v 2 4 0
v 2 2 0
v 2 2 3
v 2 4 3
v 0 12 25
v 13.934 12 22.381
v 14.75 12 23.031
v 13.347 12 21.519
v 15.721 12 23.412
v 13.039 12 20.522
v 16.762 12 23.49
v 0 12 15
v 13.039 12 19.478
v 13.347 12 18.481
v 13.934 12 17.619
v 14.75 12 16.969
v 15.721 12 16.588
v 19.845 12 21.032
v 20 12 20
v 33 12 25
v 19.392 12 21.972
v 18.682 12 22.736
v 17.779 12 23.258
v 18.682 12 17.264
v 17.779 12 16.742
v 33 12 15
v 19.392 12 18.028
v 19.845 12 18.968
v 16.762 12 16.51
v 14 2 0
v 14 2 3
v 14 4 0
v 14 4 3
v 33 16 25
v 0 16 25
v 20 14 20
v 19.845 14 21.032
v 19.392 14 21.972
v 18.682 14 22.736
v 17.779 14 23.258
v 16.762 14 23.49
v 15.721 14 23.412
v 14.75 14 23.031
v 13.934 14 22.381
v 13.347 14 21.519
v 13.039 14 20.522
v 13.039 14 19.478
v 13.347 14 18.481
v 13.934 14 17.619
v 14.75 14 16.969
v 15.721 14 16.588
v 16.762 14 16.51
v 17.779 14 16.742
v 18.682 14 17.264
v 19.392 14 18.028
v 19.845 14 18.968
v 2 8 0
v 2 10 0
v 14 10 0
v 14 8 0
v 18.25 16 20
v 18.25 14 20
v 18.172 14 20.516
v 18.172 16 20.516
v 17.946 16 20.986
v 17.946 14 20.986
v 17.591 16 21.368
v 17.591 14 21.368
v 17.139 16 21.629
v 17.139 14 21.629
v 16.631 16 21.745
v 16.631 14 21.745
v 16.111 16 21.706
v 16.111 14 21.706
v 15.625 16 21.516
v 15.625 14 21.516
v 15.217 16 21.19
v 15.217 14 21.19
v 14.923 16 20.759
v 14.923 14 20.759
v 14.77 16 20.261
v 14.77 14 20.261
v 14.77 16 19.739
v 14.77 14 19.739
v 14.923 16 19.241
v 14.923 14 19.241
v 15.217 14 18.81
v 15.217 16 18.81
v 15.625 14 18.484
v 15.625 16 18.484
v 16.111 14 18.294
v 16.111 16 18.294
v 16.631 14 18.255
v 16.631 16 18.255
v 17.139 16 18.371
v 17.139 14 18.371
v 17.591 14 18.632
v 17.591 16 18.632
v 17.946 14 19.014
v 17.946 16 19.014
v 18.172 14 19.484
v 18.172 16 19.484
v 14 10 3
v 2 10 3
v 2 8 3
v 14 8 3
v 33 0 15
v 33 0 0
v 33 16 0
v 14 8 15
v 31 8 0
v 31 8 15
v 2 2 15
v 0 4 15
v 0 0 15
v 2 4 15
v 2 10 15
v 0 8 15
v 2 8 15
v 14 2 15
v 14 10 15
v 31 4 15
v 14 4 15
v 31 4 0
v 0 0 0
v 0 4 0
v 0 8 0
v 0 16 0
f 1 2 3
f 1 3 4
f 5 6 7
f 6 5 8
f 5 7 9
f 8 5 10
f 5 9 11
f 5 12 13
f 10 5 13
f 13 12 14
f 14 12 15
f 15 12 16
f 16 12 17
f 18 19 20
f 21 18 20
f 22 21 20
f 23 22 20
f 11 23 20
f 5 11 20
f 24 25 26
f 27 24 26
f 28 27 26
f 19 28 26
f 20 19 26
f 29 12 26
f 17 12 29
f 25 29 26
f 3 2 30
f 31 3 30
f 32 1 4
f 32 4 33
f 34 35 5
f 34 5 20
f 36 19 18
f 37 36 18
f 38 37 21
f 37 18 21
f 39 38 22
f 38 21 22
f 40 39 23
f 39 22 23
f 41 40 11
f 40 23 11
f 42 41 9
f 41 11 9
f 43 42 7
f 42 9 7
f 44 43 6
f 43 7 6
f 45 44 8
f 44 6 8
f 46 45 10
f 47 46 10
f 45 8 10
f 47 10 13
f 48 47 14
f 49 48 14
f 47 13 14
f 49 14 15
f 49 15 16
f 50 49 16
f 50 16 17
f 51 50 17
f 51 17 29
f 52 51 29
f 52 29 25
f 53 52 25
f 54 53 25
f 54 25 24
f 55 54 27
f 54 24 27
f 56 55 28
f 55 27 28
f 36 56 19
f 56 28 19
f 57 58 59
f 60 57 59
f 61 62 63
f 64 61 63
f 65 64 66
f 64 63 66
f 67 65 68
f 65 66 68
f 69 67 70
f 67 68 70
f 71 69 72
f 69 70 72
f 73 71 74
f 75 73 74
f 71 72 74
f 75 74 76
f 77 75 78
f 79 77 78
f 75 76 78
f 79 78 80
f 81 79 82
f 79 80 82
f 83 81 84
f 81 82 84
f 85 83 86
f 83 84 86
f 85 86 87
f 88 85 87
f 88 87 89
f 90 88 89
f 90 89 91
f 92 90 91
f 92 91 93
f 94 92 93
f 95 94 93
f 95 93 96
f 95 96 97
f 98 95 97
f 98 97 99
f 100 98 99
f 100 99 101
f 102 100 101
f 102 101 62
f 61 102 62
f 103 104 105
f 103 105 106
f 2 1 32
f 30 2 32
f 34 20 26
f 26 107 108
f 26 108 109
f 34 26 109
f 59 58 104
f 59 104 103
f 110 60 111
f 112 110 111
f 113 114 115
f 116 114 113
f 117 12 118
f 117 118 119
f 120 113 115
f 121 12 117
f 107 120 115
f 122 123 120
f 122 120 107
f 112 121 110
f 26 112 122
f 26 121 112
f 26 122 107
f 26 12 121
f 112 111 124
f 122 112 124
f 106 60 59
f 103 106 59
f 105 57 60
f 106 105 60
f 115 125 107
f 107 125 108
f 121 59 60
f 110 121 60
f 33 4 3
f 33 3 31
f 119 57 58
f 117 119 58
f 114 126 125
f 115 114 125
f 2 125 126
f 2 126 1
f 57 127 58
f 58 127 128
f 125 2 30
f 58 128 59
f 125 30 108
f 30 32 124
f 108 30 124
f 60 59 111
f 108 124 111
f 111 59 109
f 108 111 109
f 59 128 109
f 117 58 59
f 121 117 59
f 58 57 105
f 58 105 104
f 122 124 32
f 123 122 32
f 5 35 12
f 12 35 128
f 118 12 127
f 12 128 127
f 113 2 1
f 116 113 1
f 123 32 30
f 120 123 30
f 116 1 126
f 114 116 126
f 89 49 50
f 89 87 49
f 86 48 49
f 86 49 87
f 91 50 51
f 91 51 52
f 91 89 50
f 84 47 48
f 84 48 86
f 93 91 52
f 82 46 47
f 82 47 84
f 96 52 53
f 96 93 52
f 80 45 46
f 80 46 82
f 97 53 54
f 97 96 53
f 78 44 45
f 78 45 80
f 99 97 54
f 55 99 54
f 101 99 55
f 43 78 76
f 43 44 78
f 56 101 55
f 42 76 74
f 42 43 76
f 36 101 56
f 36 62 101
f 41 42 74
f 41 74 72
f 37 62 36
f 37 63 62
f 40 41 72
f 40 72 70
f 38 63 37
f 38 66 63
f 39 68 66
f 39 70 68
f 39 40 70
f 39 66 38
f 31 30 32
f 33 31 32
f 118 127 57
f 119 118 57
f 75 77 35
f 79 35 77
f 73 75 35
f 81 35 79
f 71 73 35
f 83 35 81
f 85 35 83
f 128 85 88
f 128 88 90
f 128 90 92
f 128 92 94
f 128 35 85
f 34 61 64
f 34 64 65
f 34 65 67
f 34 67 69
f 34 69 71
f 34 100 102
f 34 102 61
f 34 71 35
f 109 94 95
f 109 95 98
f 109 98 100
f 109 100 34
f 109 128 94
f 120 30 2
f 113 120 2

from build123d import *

# Parameters (mm, degrees)
F0_W     = 33
F0_H     = 4
F1_DEPTH = 25
F0_W_2   = 12
F0_H_2   = 2
F2_DEPTH = 3
F3_DEPTH = 15
F4_R     = 1.75
F5_DEPTH = 25
F4_R_2   = 3.5
F6_DEPTH = 2


with BuildPart() as f1:
    # F0 (on Top) → F1 (new body)
    with BuildSketch(Plane.XY):
        with Locations((16.5, 14)):
            Rectangle(F0_W, F0_H)
    extrude(amount=F1_DEPTH)

    # F0 (on Top) → F3 (join)
    with BuildSketch(Plane.XY):
        Polygon((0, 4), (0, 0), (33, 0), (33, 12), (0, 12), (0, 8), (2, 8), (2, 10), (14, 10), (14, 8), (31, 8), (31, 4), (14, 4), (14, 2), (2, 2), (2, 4), align=None)
    extrude(amount=F3_DEPTH)

    # F4 (on face) → F5 (cut)
    with BuildSketch(Plane.XZ.offset(-12)):
        with Locations((16.5, 20)):
            Circle(F4_R)
    extrude(amount=-F5_DEPTH, mode=Mode.SUBTRACT)

    # F4 (on face) → F6 (cut)
    with BuildSketch(Plane.XZ.offset(-12)):
        with Locations((16.5, 20)):
            Circle(F4_R_2)
        with Locations((16.5, 20)):
            Circle(F4_R, mode=Mode.SUBTRACT)
    extrude(amount=-F6_DEPTH, mode=Mode.SUBTRACT)


with BuildPart() as f2:
    # F0 (on Top) → F2 (new body)
    with BuildSketch(Plane.XY):
        with Locations((8, 9)):
            Rectangle(F0_W_2, F0_H_2)
    extrude(amount=F2_DEPTH)


with BuildPart() as f2b:
    # F0 (on Top) → F2, piece 2 (new body)
    with BuildSketch(Plane.XY):
        with Locations((8, 3)):
            Rectangle(F0_W_2, F0_H_2)
    extrude(amount=F2_DEPTH)


solid = Compound([f1.part, f2.part, f2b.part])
